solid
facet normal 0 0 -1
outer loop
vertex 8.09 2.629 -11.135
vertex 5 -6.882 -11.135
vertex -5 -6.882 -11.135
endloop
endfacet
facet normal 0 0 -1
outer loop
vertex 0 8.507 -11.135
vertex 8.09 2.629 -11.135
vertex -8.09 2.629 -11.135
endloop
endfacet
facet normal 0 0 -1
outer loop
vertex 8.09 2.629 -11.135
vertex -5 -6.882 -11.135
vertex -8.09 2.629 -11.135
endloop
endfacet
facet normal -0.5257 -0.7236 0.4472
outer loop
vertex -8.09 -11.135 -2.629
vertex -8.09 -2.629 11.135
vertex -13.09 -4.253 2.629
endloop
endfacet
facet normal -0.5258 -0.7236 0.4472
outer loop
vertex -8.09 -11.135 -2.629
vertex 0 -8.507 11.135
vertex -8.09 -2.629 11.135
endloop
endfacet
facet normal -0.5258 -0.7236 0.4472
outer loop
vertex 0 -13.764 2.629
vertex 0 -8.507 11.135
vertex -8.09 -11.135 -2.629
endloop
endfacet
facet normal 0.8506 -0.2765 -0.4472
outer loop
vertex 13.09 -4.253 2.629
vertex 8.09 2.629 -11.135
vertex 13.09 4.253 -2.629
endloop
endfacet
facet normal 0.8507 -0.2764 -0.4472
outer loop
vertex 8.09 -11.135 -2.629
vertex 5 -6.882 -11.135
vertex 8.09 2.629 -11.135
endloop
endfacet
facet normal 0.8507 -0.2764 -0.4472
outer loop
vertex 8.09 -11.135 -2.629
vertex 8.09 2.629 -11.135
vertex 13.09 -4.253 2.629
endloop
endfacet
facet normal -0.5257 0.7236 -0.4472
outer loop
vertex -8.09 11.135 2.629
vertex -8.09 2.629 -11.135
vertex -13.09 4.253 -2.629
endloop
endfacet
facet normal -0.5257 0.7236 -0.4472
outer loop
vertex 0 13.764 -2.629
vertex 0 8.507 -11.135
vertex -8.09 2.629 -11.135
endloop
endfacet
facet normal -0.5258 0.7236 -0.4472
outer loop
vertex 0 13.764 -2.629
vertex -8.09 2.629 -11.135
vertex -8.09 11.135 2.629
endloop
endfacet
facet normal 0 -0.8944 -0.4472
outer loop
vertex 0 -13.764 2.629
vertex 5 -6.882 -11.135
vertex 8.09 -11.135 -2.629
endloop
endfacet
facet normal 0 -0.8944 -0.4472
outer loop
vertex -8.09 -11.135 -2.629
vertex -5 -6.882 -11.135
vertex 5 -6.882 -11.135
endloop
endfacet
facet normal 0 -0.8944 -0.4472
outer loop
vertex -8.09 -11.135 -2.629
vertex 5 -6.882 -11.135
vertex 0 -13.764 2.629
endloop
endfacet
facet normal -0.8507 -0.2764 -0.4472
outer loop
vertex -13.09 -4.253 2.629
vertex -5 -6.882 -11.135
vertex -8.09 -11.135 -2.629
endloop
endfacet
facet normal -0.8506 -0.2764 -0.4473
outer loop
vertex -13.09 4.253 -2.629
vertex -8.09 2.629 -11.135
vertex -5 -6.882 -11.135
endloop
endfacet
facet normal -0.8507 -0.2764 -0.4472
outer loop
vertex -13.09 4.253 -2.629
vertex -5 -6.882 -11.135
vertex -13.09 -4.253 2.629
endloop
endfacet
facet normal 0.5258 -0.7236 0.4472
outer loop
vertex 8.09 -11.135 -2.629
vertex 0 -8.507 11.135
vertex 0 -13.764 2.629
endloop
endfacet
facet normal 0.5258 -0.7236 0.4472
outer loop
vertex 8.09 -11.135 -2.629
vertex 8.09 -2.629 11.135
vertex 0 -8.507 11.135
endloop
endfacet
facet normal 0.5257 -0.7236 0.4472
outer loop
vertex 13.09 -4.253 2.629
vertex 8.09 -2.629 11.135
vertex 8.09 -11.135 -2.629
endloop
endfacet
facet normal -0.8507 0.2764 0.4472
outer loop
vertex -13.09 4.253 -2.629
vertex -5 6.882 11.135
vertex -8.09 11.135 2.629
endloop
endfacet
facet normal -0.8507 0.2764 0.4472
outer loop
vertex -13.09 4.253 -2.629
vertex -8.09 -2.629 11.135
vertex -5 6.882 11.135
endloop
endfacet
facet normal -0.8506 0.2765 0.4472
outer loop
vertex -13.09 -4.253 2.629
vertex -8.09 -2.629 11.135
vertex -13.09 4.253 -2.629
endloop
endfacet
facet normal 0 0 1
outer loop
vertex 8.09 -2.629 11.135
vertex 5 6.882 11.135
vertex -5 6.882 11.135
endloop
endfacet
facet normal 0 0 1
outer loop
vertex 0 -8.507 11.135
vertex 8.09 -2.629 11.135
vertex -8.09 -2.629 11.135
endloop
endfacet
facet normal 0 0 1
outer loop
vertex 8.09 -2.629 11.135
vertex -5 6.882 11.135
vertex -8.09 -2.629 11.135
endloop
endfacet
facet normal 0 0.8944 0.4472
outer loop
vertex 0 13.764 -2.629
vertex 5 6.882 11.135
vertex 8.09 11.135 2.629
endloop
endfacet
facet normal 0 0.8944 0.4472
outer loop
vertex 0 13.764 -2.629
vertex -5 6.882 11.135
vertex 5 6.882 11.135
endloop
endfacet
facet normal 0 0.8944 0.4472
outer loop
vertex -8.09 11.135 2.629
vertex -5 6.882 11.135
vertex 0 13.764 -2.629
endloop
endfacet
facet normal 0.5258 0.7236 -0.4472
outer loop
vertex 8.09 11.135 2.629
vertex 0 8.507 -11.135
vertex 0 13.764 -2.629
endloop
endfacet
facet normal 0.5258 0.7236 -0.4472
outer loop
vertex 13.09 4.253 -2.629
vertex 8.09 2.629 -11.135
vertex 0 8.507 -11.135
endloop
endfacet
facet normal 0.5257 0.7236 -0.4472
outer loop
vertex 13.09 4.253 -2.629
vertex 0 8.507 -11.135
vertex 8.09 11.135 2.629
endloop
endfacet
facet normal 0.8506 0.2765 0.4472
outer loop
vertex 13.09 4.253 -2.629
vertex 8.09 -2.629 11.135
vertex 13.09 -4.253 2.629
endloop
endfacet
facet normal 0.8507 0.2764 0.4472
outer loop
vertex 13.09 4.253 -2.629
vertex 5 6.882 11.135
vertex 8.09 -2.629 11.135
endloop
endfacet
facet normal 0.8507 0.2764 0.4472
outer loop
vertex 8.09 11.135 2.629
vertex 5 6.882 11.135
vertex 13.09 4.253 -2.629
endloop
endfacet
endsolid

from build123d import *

# Parameters (mm, degrees)
F6_COUNT = 5
F7_COUNT = 2


with BuildPart() as f4:
    # F3 (on line) → F4 section 0
    with BuildSketch(Plane.XY.offset(11.1351636441), mode=Mode.PRIVATE) as f4_s0:
        Polygon((5, 6.8819096024), (-5, 6.8819096024), (-8.0901699437, -2.6286555606), (0, -8.5065080835), (8.0901699437, -2.6286555606), align=None)
    loft([f4_s0.sketch, Vertex(0, 0, 0)])


with BuildPart() as f5_1:
    # F5: instance of F4
    add(f4.part.mirror(Plane(origin=(0, 4.5879397349, 7.4234424294), x_dir=(-1, 0, 0), z_dir=(0, 0.8506508084, -0.5257311121))))


with BuildPart() as f6_1:
    # F6: instance of F5_1
    add(f5_1.part.rotate(Axis((0, 0, 5.5675818221), (0, 0, 1)), 1 * 360 / F6_COUNT))


with BuildPart() as f6_2:
    # F6: instance of F5_1
    add(f5_1.part.rotate(Axis((0, 0, 5.5675818221), (0, 0, 1)), 2 * 360 / F6_COUNT))


with BuildPart() as f6_3:
    # F6: instance of F5_1
    add(f5_1.part.rotate(Axis((0, 0, 5.5675818221), (0, 0, 1)), 3 * 360 / F6_COUNT))


with BuildPart() as f6_4:
    # F6: instance of F5_1
    add(f5_1.part.rotate(Axis((0, 0, 5.5675818221), (0, 0, 1)), 4 * 360 / F6_COUNT))


with BuildPart() as f4_1:
    add(f4.part)

    add(f5_1.part)  # F7 merges F5_1

    add(f6_1.part)  # F7 merges F6_1

    add(f6_2.part)  # F7 merges F6_2

    add(f6_3.part)  # F7 merges F6_3

    add(f6_4.part)  # F7 merges F6_4
    # F7: F4, F6_3, F6_4, F5_1, F6_2, F6_1 ×2 about axis
    f7_axis = Axis((0, 0, 0), (1, 0, 0))
    for i in range(1, F7_COUNT):
        add(f4.part.rotate(f7_axis, i * 360 / F7_COUNT))
        add(f6_3.part.rotate(f7_axis, i * 360 / F7_COUNT))
        add(f6_4.part.rotate(f7_axis, i * 360 / F7_COUNT))
        add(f5_1.part.rotate(f7_axis, i * 360 / F7_COUNT))
        add(f6_2.part.rotate(f7_axis, i * 360 / F7_COUNT))
        add(f6_1.part.rotate(f7_axis, i * 360 / F7_COUNT))


solid = f4_1.part
